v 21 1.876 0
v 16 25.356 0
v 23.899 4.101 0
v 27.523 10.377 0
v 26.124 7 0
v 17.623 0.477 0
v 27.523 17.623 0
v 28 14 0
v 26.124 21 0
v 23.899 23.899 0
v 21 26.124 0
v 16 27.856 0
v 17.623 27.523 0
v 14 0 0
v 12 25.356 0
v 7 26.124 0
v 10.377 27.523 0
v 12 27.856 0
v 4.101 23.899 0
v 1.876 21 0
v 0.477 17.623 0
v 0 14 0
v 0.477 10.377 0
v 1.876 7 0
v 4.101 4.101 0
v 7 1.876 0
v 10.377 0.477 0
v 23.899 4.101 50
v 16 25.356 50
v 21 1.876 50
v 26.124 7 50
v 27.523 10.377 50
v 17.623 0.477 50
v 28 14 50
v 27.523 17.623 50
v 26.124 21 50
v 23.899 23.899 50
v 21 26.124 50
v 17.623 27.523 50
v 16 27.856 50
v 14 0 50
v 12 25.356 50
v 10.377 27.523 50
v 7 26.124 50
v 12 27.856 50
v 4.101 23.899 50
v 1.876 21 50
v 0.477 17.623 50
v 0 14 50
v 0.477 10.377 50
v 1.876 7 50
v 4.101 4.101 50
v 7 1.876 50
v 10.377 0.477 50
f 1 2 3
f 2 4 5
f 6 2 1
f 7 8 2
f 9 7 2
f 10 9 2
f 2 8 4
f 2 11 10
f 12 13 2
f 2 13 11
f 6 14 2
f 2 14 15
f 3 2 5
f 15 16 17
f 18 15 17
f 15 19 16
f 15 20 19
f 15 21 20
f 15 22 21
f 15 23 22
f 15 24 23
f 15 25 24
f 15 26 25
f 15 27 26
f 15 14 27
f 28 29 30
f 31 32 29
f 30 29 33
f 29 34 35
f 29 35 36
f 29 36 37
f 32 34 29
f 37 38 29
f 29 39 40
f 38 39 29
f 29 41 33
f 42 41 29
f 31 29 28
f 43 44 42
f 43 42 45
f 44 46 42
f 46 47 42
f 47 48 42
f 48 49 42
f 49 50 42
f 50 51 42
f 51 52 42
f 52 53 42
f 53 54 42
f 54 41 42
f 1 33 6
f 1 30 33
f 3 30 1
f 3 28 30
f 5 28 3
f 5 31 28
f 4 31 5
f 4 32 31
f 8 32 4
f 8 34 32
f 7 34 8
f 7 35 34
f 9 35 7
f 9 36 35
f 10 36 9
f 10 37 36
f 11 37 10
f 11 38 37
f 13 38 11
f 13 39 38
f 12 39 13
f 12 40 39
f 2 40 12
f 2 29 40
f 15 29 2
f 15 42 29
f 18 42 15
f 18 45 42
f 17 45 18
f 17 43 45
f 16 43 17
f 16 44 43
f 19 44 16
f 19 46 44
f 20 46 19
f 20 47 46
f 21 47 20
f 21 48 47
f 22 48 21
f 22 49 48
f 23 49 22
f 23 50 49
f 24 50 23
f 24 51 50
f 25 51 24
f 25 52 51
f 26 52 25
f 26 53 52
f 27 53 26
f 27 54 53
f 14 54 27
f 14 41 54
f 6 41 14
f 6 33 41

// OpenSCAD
$fn = 32;

// ----------------------------------------------------------------------
// Keyway shaft: d28 shaft, key 4 x 2.5 mm
// ----------------------------------------------------------------------

// --- parameters (mm) ---
shaft_r = 14;             // shaft radius
key_w = 4;                // keyway width
key_d = 2.5;              // keyway depth below the surface line
plate_t = 50;             // shaft length, Z (extrusion height)
fit_tol = 0.05;           // declared fit tolerance (prompt contract)
free_tol = 0.3;           // declared free tolerance (prompt contract)

shaft_d = 2 * shaft_r;  // shaft diameter
circle_step = 15;  // polygon sampling step, degrees

profile = [[10.377, 27.523], [7, 26.124], [4.101, 23.899], [1.876, 21], [0.477, 17.623], [0, 14], [0.477, 10.377], [1.876, 7], [4.101, 4.101], [7, 1.876], [10.377, 0.477], [14, 0], [17.623, 0.477], [21, 1.876], [23.899, 4.101], [26.124, 7], [27.523, 10.377], [28, 14], [27.523, 17.623], [26.124, 21], [23.899, 23.899], [21, 26.124], [17.623, 27.523], [16, 27.856], [16, 25.356], [12, 25.356], [12, 27.856]];  // primary outline, 27 points, counter clockwise

// --- the one profile operation ---
linear_extrude(height = plate_t) polygon(points = profile);
